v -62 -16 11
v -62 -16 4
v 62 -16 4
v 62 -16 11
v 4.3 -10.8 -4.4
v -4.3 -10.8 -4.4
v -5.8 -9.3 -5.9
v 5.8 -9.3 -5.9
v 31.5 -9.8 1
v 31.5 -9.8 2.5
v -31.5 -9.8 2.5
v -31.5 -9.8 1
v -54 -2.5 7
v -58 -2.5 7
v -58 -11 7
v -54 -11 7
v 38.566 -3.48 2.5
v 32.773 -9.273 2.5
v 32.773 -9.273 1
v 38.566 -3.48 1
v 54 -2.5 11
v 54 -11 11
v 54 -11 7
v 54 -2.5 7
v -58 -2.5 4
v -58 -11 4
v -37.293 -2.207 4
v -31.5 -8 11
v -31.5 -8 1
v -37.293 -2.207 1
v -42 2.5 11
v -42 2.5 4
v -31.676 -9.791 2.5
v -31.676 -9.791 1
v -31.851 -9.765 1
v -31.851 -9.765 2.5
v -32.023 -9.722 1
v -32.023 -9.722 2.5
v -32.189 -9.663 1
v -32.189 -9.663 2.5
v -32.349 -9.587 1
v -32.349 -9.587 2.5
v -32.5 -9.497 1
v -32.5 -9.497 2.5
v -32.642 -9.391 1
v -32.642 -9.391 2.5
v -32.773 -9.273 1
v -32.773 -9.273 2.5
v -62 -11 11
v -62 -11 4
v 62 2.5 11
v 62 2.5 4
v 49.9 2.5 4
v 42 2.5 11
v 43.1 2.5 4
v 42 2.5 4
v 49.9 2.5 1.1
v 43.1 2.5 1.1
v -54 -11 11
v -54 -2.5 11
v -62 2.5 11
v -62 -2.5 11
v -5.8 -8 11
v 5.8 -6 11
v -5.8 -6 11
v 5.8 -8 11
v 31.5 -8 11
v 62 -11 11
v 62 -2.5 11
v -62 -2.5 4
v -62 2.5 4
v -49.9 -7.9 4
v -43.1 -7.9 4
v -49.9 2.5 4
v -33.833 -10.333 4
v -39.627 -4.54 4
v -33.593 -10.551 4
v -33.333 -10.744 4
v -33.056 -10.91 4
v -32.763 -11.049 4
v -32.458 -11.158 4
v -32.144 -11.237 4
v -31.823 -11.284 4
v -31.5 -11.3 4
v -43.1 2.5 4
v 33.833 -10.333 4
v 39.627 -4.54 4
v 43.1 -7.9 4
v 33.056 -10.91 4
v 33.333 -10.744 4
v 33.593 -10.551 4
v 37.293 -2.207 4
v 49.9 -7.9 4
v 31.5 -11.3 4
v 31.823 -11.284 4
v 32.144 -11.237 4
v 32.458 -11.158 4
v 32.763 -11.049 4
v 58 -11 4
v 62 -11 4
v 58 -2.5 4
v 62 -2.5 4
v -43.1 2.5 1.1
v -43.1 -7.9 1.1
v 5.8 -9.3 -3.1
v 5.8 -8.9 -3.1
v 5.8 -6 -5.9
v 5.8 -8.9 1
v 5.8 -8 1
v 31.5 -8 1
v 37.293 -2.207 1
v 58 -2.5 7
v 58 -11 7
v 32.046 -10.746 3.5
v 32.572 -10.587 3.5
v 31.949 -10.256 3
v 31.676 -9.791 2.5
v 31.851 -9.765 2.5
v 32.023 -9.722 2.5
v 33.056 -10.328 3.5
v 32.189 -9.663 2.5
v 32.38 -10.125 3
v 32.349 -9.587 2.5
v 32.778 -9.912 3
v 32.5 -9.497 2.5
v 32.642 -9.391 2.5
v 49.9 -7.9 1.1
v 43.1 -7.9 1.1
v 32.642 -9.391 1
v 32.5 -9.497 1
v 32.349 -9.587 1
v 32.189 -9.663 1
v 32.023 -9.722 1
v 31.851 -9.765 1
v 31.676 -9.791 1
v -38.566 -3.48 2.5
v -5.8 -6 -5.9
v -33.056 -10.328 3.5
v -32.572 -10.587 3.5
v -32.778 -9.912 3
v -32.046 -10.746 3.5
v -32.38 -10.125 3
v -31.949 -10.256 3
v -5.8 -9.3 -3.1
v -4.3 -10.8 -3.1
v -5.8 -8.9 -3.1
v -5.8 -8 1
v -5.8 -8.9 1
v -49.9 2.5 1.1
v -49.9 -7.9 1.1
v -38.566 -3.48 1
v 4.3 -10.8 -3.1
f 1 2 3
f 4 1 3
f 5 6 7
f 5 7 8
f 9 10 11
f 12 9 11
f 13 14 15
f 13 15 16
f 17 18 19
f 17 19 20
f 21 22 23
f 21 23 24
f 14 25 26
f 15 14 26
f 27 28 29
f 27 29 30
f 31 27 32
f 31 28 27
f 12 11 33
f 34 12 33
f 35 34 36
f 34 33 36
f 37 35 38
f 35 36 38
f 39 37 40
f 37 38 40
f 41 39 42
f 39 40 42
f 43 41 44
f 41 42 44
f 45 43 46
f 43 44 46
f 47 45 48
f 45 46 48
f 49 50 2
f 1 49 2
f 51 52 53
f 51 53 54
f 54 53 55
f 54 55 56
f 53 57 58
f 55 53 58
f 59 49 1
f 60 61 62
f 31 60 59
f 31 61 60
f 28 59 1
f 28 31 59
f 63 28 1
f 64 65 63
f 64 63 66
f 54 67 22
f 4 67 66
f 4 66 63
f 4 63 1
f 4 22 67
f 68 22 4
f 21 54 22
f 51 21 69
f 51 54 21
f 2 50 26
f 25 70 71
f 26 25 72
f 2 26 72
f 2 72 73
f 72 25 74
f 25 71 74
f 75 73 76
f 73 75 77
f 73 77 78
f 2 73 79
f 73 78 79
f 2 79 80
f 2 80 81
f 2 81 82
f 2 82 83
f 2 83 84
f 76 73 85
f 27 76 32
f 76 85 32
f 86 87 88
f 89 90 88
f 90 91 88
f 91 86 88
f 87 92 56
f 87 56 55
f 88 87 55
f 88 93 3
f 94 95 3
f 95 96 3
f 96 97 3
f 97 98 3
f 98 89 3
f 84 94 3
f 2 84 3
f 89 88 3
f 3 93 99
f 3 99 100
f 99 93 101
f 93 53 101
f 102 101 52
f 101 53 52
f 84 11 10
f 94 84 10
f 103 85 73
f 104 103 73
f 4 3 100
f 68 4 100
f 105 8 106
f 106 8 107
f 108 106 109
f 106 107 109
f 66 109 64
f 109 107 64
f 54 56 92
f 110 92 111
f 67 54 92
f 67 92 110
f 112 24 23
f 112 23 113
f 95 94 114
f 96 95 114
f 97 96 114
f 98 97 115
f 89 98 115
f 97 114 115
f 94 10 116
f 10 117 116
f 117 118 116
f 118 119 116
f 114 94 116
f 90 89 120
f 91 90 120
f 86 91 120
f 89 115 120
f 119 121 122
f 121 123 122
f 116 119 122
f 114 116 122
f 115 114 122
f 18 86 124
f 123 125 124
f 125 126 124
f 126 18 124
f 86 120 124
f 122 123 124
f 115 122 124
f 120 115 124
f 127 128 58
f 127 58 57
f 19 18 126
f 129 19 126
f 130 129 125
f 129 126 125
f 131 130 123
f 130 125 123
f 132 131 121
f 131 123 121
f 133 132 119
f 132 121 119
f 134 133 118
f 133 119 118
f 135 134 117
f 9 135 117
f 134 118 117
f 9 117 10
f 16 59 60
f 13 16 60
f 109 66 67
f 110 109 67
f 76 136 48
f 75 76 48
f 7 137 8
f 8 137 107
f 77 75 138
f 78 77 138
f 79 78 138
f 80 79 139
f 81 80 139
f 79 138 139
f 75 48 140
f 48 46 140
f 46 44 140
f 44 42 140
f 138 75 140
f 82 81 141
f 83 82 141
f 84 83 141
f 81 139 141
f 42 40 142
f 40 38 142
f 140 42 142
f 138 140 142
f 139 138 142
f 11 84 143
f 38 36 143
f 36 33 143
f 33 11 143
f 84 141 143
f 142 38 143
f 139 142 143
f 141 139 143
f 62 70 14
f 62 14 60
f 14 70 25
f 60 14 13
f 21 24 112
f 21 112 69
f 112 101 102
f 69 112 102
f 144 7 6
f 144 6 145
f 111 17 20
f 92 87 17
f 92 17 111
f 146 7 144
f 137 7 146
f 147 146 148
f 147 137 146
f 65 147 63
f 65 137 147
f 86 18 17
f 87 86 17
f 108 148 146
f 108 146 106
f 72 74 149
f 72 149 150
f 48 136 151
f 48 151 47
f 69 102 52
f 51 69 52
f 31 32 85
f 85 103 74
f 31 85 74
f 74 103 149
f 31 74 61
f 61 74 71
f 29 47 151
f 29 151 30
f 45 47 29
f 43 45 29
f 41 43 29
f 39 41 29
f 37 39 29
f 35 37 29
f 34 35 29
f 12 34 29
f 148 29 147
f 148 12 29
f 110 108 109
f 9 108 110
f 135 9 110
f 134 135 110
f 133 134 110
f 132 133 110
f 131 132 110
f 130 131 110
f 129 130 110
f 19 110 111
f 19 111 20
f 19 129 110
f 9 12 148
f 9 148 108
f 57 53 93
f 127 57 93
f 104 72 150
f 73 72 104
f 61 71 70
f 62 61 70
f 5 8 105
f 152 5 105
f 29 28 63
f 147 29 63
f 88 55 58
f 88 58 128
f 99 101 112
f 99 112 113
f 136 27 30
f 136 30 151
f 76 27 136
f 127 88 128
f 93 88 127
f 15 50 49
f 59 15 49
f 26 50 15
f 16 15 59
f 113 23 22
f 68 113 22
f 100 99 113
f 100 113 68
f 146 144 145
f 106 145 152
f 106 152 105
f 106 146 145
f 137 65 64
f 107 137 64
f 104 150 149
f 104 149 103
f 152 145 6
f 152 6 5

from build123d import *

# Parameters (mm, degrees)
PAD002_DEPTH    = 7
PAD003_DEPTH    = 3
CHAMFER003_SIZE = 1.5
SKETCH019_W     = 4
SKETCH019_H     = 8.5
POCKET003_DEPTH = 7.001
SKETCH020_W     = 4
SKETCH020_H     = 8.5
POCKET004_DEPTH = 4
SKETCH024_W     = 11.6
SKETCH024_H     = 2.9
PAD006_DEPTH    = 16.9
SKETCH025_W     = 11.6
SKETCH025_H     = 2.8
PAD007_DEPTH    = 1.9
CHAMFER005_SIZE = 1.5
SKETCH026_W     = 6.8
SKETCH026_H     = 10.4
PAD008_DEPTH    = 2.9


with BuildPart() as part:
    # Sketch006 → Pad002 (new body)
    with BuildSketch(Plane.XY.offset(4)):
        Polygon((-62, 2.5), (-62, -16), (62, -16), (62, 2.5), (42, 2.5), (31.5, -8), (-31.5, -8), (-42, 2.5), align=None)
    extrude(amount=PAD002_DEPTH)

    # Sketch007 (on Face9 of Pad002) → Pad003 (join)
    with BuildSketch(Plane(origin=(0, 0, 4), x_dir=(1, 0, 0), z_dir=(0, 0, -1))):
        with BuildLine():
            Line((-31.5, 8), (31.5, 8))
            Line((37.293259, 2.206741), (31.5, 8))
            Line((38.566051, 3.479533), (37.293259, 2.206741))
            Line((32.772792, 9.272792), (38.566051, 3.479533))
            ThreePointArc((32.772792, 9.272792), (32.18883, 9.662983), (31.5, 9.8))
            Line((31.5, 9.8), (-31.5, 9.8))
            ThreePointArc((-31.5, 9.8), (-32.18883, 9.662983), (-32.772792, 9.272792))
            Line((-38.566051, 3.479533), (-32.772792, 9.272792))
            Line((-37.293259, 2.206741), (-38.566051, 3.479533))
            Line((-31.5, 8), (-37.293259, 2.206741))
        make_face()
    extrude(amount=PAD003_DEPTH)

    # Chamfer003
    chamfer003_edges = [part.edges().sort_by_distance(p)[0] for p in [
        (-35.669422, -6.376163, 4),
    ]]
    chamfer(chamfer003_edges, length=CHAMFER003_SIZE)

    # Sketch019 (on Face1 of Chamfer003) → Pocket003 (cut, through all)
    with BuildSketch(Plane(origin=(0, 0, 4), x_dir=(1, 0, 0), z_dir=(0, 0, -1))):
        with Locations((-60, 6.75)):
            Rectangle(SKETCH019_W, SKETCH019_H)
        with Locations((60, 6.75)):
            Rectangle(SKETCH019_W, SKETCH019_H)
    extrude(amount=-POCKET003_DEPTH, mode=Mode.SUBTRACT)

    # Sketch020 (on Face31 of Pocket003) → Pocket004 (cut)
    with BuildSketch(Plane.XY.offset(11)):
        with Locations((-56, -6.75)):
            Rectangle(SKETCH020_W, SKETCH020_H)
        with Locations((56, -6.75)):
            Rectangle(SKETCH020_W, SKETCH020_H)
    extrude(amount=-POCKET004_DEPTH, mode=Mode.SUBTRACT)

    # Sketch024 (on Face27 of Pocket004) → Pad006 (join)
    with BuildSketch(Plane.XY.offset(11)):
        with Locations((0, -7.45)):
            Rectangle(SKETCH024_W, SKETCH024_H)
    extrude(amount=-PAD006_DEPTH)

    # Sketch025 (on Face37 of Pad006) → Pad007 (join)
    with BuildSketch(Plane.XZ.offset(8.9)):
        with Locations((0, -4.5)):
            Rectangle(SKETCH025_W, SKETCH025_H)
    extrude(amount=PAD007_DEPTH)

    # Chamfer005
    chamfer005_edges = [part.edges().sort_by_distance(p)[0] for p in [
        (0, -10.8, -5.9),
        (-5.8, -10.8, -4.5),
        (5.8, -10.8, -4.5),
    ]]
    chamfer(chamfer005_edges, length=CHAMFER005_SIZE)

    # Sketch026 (on Face37 of Chamfer005) → Pad008 (join)
    with BuildSketch(Plane(origin=(0, 0, 4), x_dir=(1, 0, 0), z_dir=(0, 0, -1))):
        with Locations((-46.5, 2.7)):
            Rectangle(SKETCH026_W, SKETCH026_H)
        with Locations((46.5, 2.7)):
            Rectangle(SKETCH026_W, SKETCH026_H)
    extrude(amount=PAD008_DEPTH)


solid = part.part
